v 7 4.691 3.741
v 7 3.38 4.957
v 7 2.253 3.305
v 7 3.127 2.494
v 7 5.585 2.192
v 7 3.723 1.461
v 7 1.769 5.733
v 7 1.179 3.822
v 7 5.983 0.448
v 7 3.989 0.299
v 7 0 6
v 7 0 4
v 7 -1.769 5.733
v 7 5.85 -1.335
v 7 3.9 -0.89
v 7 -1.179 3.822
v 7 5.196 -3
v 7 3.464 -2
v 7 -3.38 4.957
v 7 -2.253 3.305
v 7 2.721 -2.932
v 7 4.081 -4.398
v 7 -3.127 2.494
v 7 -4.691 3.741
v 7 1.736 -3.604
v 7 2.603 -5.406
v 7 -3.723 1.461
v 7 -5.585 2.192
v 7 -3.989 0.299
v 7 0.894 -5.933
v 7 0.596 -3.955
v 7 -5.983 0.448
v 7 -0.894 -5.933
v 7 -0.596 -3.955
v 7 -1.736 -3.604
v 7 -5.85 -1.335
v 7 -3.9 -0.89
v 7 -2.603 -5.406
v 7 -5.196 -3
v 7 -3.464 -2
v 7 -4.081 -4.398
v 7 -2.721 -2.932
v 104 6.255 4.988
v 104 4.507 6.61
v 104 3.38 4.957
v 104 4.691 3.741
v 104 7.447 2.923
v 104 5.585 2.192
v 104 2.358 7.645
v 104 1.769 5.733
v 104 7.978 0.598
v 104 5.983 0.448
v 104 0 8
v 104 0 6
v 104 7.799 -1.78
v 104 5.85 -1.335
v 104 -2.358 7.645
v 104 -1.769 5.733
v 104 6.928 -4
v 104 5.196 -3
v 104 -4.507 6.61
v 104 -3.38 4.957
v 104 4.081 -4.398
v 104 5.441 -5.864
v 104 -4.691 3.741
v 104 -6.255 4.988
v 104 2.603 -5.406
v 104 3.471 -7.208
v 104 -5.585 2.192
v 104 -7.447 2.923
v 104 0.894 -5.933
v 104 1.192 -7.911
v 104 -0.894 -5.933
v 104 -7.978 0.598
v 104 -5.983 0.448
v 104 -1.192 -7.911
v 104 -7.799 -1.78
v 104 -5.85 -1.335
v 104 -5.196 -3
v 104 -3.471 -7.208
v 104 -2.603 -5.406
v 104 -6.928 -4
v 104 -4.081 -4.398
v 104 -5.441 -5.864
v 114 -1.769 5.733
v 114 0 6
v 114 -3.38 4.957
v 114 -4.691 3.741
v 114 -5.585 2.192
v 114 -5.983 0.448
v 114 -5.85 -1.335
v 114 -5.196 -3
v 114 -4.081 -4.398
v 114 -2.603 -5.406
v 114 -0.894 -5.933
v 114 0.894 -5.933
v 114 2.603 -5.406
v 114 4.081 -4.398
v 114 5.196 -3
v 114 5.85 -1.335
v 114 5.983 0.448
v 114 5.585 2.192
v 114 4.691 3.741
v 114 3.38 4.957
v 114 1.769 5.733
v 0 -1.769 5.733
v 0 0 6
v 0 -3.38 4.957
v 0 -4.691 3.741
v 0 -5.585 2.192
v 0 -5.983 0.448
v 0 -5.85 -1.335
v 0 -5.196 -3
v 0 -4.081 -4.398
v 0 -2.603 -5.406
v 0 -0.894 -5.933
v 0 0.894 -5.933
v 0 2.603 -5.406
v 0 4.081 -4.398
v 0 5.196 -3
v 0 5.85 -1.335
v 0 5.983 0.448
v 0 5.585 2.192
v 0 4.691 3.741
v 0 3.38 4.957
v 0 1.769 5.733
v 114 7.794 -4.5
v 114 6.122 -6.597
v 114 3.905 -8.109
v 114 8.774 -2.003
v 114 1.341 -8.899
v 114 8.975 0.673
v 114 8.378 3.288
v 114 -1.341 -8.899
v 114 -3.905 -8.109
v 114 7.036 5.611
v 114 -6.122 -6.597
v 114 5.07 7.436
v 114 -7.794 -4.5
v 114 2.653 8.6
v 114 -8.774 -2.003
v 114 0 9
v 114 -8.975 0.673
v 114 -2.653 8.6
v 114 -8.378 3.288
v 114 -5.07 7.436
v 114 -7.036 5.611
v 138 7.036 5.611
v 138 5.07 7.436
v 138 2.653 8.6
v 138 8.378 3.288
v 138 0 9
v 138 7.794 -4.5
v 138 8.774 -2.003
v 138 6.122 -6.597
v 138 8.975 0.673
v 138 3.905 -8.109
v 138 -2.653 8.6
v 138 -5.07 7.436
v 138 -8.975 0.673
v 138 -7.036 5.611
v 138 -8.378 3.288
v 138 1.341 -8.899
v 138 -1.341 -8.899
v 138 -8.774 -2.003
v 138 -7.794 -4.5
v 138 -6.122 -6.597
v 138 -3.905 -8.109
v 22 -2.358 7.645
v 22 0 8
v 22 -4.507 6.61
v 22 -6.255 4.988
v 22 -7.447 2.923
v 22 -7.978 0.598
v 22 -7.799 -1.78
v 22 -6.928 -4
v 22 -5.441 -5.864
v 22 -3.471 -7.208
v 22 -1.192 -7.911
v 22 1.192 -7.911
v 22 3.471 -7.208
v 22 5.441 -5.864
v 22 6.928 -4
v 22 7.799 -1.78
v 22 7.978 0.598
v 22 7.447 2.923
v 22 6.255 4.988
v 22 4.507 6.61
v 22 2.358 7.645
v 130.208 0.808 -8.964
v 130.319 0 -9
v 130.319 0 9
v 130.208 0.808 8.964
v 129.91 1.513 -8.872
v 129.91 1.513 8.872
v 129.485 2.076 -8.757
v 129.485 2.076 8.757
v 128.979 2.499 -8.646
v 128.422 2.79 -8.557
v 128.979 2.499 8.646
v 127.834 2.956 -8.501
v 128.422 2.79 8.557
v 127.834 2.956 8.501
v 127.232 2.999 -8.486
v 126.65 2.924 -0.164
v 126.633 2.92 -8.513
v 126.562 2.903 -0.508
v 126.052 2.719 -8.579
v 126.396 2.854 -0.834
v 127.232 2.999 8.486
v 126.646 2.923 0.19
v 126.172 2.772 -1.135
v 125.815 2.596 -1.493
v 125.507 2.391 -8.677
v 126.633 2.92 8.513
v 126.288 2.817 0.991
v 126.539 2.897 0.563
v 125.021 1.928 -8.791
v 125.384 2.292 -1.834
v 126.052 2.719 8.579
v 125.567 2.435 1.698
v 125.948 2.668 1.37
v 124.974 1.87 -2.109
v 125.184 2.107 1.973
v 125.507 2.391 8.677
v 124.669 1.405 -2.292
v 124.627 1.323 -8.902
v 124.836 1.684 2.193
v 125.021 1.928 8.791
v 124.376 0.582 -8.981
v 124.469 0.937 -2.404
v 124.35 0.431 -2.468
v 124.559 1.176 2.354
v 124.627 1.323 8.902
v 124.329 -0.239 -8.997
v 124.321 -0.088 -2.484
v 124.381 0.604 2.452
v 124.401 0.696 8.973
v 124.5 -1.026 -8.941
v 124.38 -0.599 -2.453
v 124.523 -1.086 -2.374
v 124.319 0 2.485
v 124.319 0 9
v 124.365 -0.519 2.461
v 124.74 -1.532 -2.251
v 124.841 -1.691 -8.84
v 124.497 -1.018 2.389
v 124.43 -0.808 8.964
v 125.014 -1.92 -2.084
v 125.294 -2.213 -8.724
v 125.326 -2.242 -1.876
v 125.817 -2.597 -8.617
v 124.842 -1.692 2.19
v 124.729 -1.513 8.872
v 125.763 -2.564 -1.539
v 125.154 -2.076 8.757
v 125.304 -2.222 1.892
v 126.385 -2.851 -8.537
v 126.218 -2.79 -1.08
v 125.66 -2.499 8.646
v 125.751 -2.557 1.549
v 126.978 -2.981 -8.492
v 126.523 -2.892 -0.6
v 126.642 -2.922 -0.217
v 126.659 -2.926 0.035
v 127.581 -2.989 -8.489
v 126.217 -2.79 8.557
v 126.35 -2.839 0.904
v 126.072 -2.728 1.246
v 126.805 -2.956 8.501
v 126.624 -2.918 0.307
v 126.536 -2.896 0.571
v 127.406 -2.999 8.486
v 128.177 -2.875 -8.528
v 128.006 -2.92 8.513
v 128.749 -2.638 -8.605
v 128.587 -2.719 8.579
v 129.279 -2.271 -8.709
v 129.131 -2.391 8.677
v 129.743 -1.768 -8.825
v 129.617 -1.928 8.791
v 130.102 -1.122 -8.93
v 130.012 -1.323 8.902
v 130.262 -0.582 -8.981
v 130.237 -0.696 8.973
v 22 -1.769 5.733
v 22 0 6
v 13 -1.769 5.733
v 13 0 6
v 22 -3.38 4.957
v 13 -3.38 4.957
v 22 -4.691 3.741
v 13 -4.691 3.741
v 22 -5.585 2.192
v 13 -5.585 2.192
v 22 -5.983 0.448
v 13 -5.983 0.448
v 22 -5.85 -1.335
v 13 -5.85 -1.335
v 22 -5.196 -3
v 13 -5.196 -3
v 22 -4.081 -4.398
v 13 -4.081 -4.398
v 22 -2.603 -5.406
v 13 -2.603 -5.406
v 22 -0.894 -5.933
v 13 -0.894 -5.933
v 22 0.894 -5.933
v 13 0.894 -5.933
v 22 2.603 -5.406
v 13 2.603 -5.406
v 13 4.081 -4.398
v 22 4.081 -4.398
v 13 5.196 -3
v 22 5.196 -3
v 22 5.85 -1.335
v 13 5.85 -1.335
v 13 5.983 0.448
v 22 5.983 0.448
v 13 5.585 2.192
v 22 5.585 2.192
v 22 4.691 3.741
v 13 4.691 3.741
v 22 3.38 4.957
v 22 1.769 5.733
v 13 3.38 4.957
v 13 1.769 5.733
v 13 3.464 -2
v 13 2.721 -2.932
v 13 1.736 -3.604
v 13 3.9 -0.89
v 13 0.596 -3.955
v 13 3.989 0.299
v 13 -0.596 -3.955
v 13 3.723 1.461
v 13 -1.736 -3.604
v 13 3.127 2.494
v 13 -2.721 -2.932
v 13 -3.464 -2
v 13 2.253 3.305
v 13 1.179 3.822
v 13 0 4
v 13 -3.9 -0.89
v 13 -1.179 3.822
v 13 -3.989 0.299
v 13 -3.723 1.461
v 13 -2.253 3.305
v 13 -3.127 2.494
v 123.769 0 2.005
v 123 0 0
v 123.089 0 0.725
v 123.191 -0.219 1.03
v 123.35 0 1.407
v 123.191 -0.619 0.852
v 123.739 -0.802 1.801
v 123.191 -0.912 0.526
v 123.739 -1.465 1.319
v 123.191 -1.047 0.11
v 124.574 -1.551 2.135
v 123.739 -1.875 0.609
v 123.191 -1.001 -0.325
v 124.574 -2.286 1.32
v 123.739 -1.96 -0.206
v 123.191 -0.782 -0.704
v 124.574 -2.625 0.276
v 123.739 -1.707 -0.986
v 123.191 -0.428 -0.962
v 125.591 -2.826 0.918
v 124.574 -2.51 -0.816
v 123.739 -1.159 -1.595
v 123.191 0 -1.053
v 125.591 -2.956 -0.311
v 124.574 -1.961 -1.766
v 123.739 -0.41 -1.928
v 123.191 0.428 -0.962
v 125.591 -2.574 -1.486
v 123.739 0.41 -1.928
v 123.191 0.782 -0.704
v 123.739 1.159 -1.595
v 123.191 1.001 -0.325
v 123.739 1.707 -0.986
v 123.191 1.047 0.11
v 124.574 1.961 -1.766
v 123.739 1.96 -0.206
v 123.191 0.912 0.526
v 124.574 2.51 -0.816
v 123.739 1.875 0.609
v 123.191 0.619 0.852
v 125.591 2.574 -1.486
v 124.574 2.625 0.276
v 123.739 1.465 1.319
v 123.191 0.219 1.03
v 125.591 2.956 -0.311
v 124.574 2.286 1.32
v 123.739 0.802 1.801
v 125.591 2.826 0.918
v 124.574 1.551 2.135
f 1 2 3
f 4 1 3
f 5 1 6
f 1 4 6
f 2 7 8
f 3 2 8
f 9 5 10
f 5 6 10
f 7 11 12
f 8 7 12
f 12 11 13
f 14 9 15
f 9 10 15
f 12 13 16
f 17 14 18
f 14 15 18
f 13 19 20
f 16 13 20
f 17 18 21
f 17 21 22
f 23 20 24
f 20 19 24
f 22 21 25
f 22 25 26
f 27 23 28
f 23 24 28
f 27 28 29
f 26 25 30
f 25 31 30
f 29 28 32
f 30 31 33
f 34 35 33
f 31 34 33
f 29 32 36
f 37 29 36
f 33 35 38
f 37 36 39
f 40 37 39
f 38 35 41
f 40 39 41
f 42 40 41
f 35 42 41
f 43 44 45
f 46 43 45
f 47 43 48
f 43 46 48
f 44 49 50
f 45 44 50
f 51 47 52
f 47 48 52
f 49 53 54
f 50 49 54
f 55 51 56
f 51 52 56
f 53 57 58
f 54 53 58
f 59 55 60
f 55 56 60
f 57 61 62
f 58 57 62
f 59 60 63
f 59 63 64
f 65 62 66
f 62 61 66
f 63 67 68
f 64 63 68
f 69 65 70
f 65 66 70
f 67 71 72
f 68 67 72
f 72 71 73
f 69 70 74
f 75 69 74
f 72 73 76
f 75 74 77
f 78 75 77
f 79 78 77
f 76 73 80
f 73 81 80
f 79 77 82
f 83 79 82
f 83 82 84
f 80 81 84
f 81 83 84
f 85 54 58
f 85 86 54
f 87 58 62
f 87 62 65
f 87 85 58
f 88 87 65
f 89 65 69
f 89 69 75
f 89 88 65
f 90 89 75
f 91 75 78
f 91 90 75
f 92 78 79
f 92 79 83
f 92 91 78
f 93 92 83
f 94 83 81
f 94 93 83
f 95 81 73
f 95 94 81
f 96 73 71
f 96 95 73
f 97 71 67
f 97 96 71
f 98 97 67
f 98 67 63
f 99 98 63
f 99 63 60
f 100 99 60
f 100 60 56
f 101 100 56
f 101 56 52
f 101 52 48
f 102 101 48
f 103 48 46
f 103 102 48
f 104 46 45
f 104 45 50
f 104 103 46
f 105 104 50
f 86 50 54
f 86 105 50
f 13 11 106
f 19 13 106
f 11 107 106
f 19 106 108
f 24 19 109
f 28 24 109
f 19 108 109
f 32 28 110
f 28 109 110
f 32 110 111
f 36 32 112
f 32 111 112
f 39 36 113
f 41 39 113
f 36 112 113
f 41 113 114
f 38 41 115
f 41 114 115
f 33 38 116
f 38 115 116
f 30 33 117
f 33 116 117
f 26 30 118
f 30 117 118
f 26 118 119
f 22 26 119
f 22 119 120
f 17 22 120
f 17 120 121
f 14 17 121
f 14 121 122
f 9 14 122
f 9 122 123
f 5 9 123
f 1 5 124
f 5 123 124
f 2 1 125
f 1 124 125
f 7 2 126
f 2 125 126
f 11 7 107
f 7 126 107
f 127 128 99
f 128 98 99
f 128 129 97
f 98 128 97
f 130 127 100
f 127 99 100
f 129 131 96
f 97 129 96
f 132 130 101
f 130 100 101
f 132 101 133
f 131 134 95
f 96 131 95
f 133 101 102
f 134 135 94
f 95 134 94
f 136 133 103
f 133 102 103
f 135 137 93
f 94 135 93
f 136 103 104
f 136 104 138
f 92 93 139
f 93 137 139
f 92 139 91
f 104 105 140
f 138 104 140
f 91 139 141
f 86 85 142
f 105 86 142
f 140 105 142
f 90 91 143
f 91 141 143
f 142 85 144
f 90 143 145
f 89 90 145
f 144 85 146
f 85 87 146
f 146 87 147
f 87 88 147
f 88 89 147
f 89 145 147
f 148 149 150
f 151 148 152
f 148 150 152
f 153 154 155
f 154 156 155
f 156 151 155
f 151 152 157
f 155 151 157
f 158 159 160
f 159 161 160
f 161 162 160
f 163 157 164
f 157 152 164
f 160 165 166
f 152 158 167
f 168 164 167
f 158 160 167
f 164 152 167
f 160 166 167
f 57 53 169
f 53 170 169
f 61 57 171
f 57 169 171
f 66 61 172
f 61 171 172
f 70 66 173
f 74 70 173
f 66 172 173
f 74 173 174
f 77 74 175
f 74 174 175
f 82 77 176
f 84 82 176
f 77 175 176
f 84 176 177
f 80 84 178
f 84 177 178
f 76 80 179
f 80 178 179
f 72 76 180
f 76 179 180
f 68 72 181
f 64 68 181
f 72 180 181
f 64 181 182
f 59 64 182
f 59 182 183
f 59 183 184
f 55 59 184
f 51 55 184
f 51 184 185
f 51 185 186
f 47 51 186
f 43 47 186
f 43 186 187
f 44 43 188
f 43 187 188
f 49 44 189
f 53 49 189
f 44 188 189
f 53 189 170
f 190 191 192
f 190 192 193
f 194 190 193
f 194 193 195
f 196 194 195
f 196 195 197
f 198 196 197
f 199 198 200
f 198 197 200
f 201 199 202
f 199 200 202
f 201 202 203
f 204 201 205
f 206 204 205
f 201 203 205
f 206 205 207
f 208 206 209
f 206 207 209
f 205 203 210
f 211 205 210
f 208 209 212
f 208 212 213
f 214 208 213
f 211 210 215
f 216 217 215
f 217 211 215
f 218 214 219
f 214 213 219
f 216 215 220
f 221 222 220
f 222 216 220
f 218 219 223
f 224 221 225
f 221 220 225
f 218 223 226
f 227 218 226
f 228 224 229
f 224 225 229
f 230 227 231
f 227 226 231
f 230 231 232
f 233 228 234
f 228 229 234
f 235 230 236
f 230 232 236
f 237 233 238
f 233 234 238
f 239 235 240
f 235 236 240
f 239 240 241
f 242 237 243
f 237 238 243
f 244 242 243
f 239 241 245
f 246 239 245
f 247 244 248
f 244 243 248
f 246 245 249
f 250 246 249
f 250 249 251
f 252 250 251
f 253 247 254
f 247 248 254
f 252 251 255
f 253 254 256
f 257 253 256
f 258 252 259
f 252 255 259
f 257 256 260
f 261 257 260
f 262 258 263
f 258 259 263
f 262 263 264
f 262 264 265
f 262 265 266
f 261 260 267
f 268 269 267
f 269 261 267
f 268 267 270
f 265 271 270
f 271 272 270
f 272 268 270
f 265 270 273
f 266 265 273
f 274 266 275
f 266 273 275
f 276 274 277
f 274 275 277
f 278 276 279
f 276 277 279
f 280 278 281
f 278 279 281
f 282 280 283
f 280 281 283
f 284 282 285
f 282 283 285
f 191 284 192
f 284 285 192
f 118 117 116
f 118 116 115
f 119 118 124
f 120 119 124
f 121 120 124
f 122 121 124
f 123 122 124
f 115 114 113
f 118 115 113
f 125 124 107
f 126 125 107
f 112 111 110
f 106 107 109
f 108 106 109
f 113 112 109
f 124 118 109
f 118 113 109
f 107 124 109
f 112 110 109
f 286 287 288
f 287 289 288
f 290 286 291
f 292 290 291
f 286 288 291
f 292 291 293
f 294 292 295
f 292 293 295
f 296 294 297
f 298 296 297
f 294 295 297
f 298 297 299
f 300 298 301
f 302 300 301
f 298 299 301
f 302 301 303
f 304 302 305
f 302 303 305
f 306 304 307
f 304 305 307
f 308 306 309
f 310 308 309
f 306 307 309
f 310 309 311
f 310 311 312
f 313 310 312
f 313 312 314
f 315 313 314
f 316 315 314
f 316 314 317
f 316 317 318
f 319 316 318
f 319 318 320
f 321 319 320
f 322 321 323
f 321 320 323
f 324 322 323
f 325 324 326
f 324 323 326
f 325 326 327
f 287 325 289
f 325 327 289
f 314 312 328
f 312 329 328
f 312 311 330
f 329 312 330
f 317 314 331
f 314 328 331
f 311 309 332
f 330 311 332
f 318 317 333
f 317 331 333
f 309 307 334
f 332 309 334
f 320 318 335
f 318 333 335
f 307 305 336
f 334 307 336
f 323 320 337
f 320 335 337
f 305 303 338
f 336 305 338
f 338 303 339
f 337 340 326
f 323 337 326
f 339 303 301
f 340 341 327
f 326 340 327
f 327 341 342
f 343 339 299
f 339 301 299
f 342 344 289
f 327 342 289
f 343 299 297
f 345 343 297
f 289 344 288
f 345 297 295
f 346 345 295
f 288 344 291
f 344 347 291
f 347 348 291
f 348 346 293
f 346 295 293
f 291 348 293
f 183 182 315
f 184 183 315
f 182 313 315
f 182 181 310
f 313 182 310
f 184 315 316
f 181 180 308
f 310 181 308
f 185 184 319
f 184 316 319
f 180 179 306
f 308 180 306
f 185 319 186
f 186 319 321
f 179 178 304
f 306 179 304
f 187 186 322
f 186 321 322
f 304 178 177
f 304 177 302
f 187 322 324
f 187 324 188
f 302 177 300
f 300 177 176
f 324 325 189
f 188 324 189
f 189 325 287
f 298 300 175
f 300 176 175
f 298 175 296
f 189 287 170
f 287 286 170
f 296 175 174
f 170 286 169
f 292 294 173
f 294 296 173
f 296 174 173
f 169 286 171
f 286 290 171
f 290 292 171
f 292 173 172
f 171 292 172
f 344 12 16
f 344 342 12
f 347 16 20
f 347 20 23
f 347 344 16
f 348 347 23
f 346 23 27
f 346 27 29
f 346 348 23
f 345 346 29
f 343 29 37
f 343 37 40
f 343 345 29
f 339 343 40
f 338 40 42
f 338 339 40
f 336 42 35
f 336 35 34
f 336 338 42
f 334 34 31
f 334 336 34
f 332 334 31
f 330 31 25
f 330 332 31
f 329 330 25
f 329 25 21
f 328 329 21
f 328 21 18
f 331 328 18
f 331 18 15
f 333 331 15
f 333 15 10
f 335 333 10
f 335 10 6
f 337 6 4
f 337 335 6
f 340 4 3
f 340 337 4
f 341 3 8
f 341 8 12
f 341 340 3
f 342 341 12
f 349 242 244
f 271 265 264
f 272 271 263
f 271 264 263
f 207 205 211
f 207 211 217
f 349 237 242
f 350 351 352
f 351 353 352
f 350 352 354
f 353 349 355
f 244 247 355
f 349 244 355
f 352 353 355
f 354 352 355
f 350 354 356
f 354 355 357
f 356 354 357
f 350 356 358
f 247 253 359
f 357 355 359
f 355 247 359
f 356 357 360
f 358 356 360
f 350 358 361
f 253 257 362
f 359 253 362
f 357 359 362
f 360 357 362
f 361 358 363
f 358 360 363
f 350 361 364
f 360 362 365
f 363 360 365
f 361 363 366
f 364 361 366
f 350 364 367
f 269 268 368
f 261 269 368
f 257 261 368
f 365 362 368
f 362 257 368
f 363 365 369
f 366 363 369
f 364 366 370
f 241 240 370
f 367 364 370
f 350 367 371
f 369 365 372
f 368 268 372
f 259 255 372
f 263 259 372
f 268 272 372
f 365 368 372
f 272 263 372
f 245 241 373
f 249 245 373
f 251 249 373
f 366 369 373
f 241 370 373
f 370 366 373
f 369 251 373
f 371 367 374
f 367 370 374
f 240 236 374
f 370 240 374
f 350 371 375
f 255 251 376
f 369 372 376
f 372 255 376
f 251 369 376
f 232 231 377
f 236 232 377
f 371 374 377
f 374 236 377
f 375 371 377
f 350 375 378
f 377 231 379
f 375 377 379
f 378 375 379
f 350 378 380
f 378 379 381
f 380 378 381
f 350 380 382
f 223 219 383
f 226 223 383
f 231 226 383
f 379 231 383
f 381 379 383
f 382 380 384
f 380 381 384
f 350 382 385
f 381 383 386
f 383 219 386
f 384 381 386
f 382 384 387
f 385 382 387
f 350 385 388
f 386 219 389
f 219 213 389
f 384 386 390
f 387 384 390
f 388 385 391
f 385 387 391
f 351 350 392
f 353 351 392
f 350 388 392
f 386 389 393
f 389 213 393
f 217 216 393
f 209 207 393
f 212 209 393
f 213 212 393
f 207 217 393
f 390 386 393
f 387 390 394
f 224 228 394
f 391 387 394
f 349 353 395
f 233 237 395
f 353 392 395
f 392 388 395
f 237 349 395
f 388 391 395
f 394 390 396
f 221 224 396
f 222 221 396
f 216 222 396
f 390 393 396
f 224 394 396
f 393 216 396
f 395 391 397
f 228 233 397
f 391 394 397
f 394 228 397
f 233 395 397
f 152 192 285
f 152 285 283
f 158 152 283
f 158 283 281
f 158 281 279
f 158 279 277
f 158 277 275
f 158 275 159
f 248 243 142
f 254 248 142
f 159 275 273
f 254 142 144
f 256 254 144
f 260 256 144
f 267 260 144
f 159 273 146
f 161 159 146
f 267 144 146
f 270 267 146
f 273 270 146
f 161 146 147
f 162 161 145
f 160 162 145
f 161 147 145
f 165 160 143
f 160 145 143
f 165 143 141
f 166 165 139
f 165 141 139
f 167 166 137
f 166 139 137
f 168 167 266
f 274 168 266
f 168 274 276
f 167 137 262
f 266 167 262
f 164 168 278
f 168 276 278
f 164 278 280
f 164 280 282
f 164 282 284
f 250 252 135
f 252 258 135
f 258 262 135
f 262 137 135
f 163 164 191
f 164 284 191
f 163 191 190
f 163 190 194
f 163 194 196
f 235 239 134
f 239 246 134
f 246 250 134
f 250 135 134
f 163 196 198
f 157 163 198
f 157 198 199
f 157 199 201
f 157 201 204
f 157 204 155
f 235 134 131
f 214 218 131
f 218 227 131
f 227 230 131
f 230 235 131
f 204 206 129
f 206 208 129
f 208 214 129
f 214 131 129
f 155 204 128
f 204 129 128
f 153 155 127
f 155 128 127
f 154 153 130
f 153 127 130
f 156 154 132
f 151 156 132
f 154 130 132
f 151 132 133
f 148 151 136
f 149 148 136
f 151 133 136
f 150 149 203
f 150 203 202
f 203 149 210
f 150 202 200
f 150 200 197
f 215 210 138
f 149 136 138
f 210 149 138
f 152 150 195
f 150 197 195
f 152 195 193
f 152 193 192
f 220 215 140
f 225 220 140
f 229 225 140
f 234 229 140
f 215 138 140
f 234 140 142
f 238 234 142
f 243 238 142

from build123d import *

# Parameters (mm, degrees)
SKETCH2_W          = 10
SKETCH2_H          = 6
SKETCH2_W_2        = 6
SKETCH2_H_2        = 4
SKETCH3_R          = 3
CUT_EXTRUDE1_DEPTH = 140.45967159


with BuildPart() as part:
    # Sketch2 → Revolve1 (revolve)
    with BuildSketch(Plane.XY, mode=Mode.PRIVATE) as revolve1_sk:
        Polygon((22, 6), (22, 0), (104, 0), (104, 6), (104, 8), (22, 8), align=None)
        with Locations((109, 3)):
            Rectangle(SKETCH2_W, SKETCH2_H)
        with BuildLine():
            Line((114, 6), (114, 0))
            Line((114, 0), (123, 0))
            ThreePointArc((123, 0), (126, 3), (129, 0))
            Line((129, 0), (138, 0))
            Line((138, 0), (138, 9))
            Line((138, 9), (114, 9))
            Line((114, 9), (114, 6))
        make_face()
        Polygon((13, 4), (13, 0), (22, 0), (22, 6), (13, 6), align=None)
        Polygon((0, 6), (0, 0), (7, 0), (7, 4), (7, 6), align=None)
        with Locations((10, 2)):
            Rectangle(SKETCH2_W_2, SKETCH2_H_2)
    revolve(revolve1_sk.sketch.rotate(Axis((-35.742937112, 0, 0), (1, 0, 0)), 90), axis=Axis((-35.742937112, 0, 0), (1, 0, 0)))

    # Sketch3 → Cut-Extrude1 (cut, through all)
    with BuildSketch(Plane.XY.offset(9)):
        with Locations((127.319310505, 0)):
            Circle(SKETCH3_R)
    extrude(amount=-CUT_EXTRUDE1_DEPTH, mode=Mode.SUBTRACT)


solid = part.part
